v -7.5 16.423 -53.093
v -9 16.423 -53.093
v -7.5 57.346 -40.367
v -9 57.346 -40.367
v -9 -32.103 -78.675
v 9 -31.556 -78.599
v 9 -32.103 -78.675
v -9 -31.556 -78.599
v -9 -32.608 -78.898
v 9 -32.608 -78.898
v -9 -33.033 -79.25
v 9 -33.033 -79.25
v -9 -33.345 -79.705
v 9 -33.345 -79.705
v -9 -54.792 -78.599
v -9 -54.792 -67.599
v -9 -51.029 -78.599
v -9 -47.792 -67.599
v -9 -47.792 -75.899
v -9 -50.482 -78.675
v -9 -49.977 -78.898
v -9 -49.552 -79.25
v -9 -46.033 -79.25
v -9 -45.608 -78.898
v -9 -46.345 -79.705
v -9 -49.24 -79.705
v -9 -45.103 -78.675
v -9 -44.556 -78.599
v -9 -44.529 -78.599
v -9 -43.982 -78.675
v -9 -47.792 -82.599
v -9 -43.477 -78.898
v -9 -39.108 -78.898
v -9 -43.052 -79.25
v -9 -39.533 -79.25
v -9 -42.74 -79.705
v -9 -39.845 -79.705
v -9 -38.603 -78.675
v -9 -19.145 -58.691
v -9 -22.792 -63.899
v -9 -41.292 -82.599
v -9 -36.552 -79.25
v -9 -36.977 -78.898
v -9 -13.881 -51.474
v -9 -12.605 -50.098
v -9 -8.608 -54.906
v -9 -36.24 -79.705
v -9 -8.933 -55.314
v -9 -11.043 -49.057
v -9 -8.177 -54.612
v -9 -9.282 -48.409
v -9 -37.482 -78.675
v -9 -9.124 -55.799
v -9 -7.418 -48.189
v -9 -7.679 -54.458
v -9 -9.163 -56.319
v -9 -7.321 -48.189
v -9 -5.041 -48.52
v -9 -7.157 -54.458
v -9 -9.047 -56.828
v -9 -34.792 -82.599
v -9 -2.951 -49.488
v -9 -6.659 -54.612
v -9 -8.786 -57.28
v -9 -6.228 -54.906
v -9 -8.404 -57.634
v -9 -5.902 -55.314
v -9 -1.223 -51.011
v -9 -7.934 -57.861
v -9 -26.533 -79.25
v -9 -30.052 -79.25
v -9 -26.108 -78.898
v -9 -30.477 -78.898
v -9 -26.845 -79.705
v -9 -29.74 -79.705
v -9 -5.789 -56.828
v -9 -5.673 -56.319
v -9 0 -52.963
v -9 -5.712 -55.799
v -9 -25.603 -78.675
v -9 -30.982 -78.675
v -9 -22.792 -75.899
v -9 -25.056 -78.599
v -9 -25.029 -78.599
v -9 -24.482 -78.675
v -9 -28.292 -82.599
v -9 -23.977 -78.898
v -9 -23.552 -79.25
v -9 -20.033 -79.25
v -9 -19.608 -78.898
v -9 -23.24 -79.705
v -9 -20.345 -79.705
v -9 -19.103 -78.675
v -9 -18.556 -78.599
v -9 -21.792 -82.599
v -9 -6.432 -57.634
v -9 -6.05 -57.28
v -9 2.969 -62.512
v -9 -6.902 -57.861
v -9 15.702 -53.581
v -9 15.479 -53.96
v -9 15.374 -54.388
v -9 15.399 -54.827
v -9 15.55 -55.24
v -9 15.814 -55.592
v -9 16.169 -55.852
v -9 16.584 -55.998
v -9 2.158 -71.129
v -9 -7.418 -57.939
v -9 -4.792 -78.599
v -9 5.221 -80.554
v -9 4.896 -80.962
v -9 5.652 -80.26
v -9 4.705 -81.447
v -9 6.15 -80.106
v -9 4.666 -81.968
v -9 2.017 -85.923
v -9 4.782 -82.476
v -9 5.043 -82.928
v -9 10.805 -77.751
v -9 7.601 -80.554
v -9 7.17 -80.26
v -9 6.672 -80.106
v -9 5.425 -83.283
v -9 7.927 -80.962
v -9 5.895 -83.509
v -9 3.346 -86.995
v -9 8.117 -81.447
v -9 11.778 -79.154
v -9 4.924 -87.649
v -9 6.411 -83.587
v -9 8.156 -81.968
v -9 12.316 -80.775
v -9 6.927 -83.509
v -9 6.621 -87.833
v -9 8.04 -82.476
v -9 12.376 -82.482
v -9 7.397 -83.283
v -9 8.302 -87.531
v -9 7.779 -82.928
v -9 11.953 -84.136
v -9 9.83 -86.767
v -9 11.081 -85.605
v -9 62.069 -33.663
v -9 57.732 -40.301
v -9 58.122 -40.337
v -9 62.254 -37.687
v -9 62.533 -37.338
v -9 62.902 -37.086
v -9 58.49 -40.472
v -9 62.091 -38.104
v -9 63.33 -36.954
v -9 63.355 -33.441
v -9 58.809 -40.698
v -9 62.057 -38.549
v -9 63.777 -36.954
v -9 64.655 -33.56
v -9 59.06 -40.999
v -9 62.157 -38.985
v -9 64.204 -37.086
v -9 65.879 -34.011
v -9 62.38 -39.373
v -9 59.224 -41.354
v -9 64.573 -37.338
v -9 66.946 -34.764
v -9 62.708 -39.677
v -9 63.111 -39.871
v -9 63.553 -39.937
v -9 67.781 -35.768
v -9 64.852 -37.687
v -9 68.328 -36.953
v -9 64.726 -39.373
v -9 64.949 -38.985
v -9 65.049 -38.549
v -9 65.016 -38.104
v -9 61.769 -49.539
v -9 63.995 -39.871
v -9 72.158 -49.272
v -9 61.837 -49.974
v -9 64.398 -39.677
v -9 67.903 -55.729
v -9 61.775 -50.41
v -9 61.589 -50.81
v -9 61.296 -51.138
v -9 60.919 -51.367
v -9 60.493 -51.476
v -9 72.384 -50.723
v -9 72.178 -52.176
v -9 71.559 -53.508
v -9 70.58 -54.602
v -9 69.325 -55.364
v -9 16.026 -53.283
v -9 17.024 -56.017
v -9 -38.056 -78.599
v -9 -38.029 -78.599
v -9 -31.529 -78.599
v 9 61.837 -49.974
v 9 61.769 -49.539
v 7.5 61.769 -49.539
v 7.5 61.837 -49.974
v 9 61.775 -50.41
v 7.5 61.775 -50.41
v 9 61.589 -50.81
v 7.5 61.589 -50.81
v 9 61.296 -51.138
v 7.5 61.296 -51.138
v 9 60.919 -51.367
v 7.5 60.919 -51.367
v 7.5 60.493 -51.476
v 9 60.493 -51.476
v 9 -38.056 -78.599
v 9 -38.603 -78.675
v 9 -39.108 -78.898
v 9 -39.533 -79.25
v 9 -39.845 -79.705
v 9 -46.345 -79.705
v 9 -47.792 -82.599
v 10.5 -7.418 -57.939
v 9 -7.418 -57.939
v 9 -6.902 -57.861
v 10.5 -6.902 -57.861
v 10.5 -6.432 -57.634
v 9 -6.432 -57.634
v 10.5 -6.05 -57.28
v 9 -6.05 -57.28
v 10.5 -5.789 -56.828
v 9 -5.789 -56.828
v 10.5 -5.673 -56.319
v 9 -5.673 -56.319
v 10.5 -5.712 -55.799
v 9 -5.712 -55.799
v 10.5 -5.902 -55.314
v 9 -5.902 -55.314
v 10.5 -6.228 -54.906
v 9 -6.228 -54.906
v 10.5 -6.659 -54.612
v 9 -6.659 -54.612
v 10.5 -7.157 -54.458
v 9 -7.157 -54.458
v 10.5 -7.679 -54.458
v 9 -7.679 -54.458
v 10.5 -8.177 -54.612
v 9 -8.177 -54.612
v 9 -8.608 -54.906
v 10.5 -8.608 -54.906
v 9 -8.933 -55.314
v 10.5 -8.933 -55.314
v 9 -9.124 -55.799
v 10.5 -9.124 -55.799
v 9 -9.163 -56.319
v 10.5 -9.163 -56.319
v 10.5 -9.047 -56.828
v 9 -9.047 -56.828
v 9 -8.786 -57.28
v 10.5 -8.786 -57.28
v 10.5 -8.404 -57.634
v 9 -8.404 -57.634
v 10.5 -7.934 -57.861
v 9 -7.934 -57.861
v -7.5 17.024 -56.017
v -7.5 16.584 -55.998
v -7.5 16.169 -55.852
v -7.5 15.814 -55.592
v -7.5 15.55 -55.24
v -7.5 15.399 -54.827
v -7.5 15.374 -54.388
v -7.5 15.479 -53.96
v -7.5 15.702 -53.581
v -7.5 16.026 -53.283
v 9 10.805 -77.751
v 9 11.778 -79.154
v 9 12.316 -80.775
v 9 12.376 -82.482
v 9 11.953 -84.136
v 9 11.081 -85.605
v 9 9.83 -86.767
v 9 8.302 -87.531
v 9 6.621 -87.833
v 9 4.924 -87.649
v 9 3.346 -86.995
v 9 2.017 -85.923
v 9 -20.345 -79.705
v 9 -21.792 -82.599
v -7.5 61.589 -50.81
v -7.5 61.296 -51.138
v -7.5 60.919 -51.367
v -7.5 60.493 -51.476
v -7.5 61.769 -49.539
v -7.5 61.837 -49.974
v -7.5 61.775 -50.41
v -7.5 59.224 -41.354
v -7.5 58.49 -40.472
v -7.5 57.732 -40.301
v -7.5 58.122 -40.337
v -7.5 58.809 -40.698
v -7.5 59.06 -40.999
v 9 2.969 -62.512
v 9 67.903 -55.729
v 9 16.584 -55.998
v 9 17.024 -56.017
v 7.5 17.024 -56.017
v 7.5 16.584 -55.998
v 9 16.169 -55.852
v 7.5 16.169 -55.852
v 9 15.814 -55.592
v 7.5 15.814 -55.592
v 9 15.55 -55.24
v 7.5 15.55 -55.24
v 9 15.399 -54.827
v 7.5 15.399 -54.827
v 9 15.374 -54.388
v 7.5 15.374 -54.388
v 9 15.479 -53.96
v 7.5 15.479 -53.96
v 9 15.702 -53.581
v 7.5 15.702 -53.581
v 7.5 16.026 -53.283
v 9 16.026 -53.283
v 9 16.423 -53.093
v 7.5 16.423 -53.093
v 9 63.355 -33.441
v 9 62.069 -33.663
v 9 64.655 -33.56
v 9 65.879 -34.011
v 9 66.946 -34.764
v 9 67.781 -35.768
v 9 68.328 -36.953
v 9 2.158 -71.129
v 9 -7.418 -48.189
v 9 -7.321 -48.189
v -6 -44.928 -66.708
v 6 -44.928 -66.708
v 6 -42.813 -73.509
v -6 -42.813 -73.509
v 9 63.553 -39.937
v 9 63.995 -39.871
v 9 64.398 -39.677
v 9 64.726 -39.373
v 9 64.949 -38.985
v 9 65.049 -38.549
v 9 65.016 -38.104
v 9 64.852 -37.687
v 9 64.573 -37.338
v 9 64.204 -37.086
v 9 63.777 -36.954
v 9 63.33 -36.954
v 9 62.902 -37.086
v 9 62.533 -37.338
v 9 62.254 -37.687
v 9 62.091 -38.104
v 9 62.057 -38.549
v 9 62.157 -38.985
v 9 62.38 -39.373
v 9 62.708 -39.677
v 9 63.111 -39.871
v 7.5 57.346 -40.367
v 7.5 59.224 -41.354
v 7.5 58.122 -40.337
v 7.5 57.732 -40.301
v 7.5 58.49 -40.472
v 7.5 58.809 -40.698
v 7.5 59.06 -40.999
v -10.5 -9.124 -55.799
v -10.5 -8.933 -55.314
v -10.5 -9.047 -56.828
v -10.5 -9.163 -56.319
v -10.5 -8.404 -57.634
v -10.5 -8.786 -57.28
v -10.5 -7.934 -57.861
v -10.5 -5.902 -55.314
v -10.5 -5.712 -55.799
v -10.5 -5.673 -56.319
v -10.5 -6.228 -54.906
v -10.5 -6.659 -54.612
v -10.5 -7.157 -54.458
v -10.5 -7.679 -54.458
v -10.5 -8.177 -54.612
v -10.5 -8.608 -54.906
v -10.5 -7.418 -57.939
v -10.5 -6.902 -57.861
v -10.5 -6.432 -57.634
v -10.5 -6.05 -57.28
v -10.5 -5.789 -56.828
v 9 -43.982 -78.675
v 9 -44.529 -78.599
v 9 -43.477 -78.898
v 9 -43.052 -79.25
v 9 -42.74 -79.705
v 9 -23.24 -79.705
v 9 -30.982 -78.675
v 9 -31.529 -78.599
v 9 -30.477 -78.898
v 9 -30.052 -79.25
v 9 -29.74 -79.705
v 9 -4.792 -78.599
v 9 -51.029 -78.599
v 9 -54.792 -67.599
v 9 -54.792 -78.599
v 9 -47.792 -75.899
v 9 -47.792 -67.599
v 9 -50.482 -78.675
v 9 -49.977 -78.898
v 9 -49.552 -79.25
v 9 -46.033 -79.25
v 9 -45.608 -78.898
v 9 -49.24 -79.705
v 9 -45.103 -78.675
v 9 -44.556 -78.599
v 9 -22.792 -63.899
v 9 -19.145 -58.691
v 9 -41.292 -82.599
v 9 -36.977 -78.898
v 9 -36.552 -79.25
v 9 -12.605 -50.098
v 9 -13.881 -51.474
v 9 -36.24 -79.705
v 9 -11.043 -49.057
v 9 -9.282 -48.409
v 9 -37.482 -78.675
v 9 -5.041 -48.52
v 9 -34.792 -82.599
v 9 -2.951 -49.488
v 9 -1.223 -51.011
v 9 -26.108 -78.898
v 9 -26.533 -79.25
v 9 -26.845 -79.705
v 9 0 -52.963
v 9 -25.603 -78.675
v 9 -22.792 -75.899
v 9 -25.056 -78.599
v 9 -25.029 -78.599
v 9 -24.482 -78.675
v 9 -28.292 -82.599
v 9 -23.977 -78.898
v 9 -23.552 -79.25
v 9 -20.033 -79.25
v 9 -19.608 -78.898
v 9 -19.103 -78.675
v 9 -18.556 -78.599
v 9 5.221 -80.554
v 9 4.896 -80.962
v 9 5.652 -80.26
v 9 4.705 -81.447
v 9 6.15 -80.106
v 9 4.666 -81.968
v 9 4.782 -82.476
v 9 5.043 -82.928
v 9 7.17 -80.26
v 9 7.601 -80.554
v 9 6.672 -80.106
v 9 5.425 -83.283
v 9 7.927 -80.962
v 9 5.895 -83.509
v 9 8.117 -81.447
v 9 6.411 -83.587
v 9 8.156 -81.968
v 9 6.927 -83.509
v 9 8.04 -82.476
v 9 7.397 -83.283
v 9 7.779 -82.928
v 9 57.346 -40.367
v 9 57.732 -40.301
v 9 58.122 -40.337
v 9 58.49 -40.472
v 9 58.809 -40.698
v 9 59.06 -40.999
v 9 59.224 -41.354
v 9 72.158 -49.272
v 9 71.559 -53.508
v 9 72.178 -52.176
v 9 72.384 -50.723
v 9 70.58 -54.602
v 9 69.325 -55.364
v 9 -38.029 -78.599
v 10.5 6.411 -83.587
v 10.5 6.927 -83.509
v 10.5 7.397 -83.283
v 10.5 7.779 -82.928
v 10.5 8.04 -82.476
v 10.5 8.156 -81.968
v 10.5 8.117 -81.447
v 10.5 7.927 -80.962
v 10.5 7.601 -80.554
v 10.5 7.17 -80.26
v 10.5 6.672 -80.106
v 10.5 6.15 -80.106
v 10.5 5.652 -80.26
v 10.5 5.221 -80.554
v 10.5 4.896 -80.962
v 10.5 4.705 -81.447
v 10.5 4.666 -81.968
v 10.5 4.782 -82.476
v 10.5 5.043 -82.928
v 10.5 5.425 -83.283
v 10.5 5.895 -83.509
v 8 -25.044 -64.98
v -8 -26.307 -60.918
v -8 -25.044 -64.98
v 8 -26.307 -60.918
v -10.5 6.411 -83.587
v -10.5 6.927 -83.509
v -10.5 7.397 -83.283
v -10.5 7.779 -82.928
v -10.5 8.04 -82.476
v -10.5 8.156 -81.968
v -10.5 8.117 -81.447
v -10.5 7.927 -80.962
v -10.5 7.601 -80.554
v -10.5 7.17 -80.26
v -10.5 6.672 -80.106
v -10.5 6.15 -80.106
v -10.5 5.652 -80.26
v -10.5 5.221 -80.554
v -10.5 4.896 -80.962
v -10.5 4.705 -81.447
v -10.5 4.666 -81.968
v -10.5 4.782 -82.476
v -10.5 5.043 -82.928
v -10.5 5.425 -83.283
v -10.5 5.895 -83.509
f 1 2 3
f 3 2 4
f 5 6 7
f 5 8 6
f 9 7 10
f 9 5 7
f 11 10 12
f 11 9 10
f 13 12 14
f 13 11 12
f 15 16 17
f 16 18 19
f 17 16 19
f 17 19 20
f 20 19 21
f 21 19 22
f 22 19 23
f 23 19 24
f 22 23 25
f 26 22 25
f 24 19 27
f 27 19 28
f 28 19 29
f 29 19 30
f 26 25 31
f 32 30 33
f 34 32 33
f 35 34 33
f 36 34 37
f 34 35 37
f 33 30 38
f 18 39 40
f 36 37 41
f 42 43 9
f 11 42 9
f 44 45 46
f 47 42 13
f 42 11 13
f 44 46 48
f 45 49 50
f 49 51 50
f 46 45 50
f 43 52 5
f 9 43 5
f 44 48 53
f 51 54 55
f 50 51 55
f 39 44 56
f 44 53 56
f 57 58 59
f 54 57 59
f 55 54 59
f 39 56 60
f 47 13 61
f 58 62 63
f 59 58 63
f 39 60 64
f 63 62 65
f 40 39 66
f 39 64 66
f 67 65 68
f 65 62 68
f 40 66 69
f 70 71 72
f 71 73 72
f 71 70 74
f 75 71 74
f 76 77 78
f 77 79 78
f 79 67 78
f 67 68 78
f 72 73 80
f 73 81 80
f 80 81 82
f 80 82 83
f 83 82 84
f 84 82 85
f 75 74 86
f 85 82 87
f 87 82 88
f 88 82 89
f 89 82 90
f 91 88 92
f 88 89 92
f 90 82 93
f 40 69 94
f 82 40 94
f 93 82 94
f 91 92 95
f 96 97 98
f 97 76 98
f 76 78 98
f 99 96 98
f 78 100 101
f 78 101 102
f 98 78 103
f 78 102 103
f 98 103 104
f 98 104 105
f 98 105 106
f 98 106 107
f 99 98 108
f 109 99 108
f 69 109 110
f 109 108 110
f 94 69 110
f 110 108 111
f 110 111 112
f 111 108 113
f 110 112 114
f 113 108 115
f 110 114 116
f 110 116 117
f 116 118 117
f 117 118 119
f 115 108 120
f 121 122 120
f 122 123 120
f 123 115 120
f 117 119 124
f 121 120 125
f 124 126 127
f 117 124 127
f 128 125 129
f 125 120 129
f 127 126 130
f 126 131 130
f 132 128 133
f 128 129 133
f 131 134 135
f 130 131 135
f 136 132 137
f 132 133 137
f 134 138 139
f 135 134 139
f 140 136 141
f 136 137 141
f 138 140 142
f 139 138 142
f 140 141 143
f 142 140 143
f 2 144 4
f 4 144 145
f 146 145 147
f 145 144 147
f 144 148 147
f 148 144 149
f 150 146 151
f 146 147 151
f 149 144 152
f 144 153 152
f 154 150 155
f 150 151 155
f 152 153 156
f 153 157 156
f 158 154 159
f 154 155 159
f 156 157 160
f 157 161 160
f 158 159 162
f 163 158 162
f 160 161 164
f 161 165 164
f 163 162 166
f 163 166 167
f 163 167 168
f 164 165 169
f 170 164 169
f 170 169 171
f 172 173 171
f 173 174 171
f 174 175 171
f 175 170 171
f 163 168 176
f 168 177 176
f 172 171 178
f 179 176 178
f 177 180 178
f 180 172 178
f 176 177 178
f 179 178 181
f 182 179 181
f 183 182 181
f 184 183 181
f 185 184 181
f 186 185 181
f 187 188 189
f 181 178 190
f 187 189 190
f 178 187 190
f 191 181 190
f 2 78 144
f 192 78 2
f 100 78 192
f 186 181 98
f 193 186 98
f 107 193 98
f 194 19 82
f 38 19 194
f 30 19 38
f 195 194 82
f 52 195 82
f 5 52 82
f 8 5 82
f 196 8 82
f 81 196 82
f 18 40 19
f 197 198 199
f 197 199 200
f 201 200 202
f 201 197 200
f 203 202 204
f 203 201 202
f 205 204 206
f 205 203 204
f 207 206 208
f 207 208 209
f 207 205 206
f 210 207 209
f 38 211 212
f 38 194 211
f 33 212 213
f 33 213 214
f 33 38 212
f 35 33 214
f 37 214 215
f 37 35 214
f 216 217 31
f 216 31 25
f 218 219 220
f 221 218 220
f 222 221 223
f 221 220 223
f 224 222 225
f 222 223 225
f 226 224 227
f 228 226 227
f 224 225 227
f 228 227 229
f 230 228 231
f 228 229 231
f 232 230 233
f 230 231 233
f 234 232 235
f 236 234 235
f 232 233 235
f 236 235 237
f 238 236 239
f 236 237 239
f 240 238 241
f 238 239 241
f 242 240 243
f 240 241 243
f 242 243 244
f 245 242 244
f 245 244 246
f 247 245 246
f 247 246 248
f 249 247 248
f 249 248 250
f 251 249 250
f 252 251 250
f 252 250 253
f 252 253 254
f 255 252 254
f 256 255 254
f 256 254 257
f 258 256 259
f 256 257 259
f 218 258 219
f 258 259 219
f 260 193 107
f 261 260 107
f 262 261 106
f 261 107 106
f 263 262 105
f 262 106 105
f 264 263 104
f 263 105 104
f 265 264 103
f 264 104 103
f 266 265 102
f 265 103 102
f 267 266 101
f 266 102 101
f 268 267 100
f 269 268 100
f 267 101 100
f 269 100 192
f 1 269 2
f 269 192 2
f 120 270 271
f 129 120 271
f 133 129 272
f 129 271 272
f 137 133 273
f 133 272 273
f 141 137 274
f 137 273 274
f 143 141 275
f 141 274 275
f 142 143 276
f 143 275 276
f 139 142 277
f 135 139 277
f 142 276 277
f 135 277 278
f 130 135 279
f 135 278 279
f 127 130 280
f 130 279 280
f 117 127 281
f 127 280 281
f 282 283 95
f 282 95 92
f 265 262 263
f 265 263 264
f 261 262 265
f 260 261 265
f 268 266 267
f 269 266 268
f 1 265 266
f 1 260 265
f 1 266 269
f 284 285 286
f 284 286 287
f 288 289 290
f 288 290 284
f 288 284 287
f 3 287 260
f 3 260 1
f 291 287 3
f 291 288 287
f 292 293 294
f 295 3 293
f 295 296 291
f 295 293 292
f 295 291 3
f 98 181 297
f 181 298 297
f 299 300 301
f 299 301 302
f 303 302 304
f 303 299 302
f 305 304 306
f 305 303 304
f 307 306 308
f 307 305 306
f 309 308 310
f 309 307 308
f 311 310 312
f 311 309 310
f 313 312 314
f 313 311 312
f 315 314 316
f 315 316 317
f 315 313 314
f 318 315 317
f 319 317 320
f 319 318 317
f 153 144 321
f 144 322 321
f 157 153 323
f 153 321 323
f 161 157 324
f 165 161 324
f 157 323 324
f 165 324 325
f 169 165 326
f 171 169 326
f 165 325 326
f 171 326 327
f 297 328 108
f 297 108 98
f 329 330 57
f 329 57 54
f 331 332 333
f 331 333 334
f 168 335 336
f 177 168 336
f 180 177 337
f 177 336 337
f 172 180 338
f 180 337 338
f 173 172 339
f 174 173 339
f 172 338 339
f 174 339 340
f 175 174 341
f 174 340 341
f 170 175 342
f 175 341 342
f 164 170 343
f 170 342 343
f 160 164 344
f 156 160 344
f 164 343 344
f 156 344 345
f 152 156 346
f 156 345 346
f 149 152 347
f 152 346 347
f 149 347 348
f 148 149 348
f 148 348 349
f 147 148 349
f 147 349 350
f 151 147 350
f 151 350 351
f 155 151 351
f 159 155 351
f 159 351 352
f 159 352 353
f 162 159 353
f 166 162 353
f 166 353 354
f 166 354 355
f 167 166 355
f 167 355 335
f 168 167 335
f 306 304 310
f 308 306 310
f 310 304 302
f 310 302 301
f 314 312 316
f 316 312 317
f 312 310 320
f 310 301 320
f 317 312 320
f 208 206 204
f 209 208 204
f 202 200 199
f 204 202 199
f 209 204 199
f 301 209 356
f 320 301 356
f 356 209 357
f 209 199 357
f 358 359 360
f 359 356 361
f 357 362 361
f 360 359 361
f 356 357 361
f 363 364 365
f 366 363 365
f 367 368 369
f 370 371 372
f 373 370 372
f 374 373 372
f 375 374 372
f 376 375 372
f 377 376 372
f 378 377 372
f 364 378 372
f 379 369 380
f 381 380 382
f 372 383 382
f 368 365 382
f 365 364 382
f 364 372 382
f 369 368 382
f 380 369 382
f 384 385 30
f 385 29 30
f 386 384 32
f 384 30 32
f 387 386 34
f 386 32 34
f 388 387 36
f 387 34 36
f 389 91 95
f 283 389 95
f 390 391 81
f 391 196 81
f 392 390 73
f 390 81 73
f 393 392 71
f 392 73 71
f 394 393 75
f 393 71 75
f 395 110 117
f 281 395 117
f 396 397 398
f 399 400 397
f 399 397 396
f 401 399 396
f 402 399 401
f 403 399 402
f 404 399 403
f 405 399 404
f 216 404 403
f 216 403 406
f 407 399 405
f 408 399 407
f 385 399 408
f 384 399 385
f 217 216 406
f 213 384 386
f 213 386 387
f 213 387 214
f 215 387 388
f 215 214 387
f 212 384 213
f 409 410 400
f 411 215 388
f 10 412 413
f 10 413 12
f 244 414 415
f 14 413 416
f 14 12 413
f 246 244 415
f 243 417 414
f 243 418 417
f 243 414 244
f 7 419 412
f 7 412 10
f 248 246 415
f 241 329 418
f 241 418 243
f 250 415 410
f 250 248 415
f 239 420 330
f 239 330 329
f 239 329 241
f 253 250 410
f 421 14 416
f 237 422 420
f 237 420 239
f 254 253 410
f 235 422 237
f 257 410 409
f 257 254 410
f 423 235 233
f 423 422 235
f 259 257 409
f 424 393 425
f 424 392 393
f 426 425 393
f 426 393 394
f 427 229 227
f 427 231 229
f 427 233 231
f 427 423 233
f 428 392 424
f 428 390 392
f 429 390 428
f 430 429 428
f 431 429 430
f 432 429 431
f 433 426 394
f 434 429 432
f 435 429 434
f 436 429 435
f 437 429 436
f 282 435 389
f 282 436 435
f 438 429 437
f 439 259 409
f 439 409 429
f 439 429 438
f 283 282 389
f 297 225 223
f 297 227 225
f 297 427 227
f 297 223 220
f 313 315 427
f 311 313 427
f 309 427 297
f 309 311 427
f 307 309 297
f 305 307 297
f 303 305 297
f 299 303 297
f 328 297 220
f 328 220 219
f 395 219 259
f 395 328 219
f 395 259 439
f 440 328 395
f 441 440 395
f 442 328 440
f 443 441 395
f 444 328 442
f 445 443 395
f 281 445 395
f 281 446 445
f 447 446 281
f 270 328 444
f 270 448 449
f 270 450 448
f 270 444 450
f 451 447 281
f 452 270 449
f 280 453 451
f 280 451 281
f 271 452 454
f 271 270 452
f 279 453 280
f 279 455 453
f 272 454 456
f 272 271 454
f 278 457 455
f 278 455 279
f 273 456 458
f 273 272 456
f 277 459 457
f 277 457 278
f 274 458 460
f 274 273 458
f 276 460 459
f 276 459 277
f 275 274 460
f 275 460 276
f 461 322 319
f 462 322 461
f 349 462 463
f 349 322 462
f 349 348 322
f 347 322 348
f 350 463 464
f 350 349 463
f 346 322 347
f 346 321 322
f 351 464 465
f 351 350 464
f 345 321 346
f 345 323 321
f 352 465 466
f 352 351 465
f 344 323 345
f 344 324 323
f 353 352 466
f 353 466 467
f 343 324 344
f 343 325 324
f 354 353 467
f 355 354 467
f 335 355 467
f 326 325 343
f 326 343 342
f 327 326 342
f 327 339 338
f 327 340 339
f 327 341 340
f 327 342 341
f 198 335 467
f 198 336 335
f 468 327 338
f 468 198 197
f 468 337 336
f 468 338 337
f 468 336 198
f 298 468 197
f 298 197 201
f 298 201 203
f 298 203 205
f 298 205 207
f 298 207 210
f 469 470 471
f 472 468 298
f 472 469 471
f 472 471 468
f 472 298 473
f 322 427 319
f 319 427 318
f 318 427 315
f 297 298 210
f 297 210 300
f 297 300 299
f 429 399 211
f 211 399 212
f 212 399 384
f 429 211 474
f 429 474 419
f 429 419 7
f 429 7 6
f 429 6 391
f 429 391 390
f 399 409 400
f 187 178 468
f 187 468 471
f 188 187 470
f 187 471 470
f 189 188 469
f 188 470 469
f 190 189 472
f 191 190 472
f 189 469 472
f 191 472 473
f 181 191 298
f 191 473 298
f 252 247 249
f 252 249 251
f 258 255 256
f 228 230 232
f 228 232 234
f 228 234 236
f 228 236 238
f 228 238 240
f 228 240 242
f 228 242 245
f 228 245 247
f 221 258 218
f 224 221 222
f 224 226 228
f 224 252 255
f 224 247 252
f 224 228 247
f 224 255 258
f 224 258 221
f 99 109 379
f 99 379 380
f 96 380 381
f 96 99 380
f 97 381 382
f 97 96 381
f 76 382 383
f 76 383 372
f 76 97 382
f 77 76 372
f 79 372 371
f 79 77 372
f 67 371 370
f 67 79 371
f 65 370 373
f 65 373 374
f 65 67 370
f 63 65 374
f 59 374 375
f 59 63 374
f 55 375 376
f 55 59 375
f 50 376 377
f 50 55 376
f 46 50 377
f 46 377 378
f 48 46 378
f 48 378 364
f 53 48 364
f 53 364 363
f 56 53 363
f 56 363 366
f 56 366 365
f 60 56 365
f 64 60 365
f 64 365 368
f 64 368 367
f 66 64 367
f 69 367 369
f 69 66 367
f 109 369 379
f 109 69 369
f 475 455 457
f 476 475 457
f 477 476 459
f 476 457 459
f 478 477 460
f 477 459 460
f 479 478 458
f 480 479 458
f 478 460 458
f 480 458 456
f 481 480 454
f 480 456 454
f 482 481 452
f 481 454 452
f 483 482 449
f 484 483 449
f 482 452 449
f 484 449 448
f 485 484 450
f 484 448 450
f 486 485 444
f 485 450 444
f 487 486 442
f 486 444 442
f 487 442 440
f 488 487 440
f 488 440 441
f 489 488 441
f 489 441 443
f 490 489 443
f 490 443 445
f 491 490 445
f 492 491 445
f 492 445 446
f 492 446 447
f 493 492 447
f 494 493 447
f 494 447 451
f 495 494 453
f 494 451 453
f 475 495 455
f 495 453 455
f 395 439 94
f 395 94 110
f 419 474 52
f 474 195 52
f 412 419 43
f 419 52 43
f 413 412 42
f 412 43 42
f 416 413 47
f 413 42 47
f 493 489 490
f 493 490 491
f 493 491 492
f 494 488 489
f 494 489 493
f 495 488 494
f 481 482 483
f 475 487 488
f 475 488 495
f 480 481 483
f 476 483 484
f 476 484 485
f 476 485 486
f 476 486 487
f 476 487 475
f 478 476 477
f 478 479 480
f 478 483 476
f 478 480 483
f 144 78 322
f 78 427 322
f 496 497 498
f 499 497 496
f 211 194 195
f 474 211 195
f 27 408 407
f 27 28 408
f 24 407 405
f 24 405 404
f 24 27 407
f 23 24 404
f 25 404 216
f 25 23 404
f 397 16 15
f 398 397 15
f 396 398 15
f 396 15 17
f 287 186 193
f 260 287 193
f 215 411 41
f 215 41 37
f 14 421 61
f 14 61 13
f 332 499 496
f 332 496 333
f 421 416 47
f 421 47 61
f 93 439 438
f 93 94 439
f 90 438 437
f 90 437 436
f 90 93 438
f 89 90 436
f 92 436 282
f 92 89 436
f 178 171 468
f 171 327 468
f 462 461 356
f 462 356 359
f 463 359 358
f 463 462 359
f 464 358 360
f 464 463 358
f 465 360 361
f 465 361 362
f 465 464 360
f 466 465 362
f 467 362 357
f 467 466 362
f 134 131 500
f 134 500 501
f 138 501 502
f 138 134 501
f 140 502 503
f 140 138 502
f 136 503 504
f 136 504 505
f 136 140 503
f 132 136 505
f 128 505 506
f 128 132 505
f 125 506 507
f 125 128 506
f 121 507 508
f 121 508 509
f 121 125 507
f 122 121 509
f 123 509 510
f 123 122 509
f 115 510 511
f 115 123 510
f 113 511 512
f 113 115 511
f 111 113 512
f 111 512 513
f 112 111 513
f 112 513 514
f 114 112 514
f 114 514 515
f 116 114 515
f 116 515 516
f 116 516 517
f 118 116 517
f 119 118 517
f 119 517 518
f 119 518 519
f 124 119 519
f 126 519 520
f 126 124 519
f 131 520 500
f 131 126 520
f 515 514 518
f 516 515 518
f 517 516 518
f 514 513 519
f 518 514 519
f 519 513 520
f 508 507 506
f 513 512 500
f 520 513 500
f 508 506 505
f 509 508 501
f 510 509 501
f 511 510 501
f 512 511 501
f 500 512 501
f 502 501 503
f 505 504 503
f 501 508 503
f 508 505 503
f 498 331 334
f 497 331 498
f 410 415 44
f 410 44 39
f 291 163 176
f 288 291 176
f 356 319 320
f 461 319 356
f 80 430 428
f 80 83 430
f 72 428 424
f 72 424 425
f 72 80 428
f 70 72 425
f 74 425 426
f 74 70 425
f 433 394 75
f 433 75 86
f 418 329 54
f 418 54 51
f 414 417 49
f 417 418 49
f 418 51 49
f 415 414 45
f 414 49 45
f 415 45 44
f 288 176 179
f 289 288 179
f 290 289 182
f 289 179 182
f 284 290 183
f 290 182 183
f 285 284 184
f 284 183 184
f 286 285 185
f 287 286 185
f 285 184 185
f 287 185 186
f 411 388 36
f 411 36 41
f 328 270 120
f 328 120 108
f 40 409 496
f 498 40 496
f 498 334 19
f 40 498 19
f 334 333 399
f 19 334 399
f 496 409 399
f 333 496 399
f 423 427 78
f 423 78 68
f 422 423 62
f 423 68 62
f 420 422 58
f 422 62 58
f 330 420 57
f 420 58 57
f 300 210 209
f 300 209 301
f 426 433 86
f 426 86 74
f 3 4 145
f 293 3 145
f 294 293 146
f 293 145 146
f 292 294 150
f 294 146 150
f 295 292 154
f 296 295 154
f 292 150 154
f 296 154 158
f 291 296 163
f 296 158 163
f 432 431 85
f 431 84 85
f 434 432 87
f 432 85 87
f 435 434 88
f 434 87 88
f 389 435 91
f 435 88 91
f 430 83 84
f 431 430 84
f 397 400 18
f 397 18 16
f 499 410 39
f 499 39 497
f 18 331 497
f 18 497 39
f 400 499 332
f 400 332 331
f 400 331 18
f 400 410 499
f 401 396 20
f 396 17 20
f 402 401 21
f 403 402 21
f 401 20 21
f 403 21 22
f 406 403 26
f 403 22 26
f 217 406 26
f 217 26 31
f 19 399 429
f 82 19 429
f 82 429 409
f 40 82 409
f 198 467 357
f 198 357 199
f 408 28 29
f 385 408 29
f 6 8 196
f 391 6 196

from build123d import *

# Parameters (mm, degrees)
BOSS_EXTRUDE1_DEPTH    = 9
CUT_EXTRUDE1_DEPTH     = 25
BOSS_EXTRUDE2_DEPTH    = 18
FILLET1_R              = 2
LPATTERN1_COUNT        = 5
LPATTERN1_PITCH        = 6.5
FILLET1_OF_LPATTERN1_R = 2
FILLET2_R              = 8
FILLET3_R              = 5
SKETCH4_R              = 1.5
CUT_EXTRUDE2_DEPTH     = 25
CUT_EXTRUDE3_DEPTH     = 8
SKETCH6_R              = 1.75
BOSS_EXTRUDE3_DEPTH    = 1.5
SKETCH7_R              = 1.75
BOSS_EXTRUDE4_DEPTH    = 1.5
CUT_EXTRUDE4_DEPTH     = 1.5


with BuildPart() as part:
    # Sketch1 → Boss-Extrude1 (new, symmetric)
    with BuildSketch(Plane(origin=(0, 0, 0), x_dir=(0, 0, -1), z_dir=(1, 0, 0))):
        Polygon((78.599259113, -4.792439116), (85.922516335, 2.017105925), (77.751062285, 10.805014591), (71.129492545, 2.15772468), (62.512029777, 2.969258034), (52.963024241, 0), (48.188521473, -1.484629017), (48.188521473, -11.484629017), (58.691485012, -19.145422508), (67.599259113, -47.792439116), (67.599259113, -54.792439116), (78.599259113, -54.792439116), align=None)
        Polygon((62.512029777, 2.969258034), (52.963024241, 0), (32.178218004, 66.843038752), (55.09583129, 73.969258034), align=None)
        with BuildLine():
            Line((85.922516335, 2.017105925), (77.751062285, 10.805014591))
            ThreePointArc((77.751062285, 10.805014591), (86.230743643, 10.496787283), (85.922516335, 2.017105925))
        make_face()
    extrude(amount=BOSS_EXTRUDE1_DEPTH, both=True)

    # Sketch2 → Cut-Extrude1 (cut)
    with BuildSketch(Plane(origin=(9, 0, 0), x_dir=(0, 0, -1), z_dir=(1, 0, 0))):
        Polygon((75.899259113, -47.792439116), (75.899259113, -22.792439116), (63.899259113, -22.792439116), align=None)
    extrude(amount=-CUT_EXTRUDE1_DEPTH, mode=Mode.SUBTRACT)

    # Sketch3 → Boss-Extrude2 (add)
    with BuildSketch(Plane(origin=(9, 0, 0), x_dir=(0, 0, -1), z_dir=(1, 0, 0))):
        Polygon((78.599259113, -47.792439116), (78.599259113, -49.792439116), (82.599259113, -47.792439116), align=None)
        Polygon((78.599259113, -45.792439116), (78.599259113, -47.792439116), (82.599259113, -47.792439116), align=None)
    boss_extrude2 = extrude(amount=-BOSS_EXTRUDE2_DEPTH)

    # Fillet1
    fillet1_edges = [part.edges().sort_by_distance(p)[0] for p in [
        (0, -49.792439116, -78.599259113),
        (0, -45.792439116, -78.599259113),
    ]]
    fillet(fillet1_edges, radius=FILLET1_R)

    # LPattern1: Boss-Extrude2 ×5
    with Locations(*[(0, i * LPATTERN1_PITCH, 0) for i in range(1, LPATTERN1_COUNT)]):
        add(boss_extrude2)

    # Fillet1 of LPattern1
    fillet1_of_lpattern1_edges = [part.edges().sort_by_distance(p)[0] for p in [
        (0, -43.292439116, -78.599259113),
        (0, -39.292439116, -78.599259113),
        (0, -36.792439116, -78.599259113),
        (0, -32.792439116, -78.599259113),
        (0, -30.292439116, -78.599259113),
        (0, -26.292439116, -78.599259113),
        (0, -23.792439116, -78.599259113),
        (0, -19.792439116, -78.599259113),
    ]]
    fillet(fillet1_of_lpattern1_edges, radius=FILLET1_OF_LPATTERN1_R)

    # Fillet2
    # the kernel refuses this fillet: 8 mm, written as the material it takes off along each edge
    with BuildSketch(Plane(origin=(-19.167047595, -11.484629017, -48.188521473), x_dir=(0, -0.5892918069975562, -0.8079202721838058), z_dir=(1, 0, 0))) as fillet2_piece_1:
        with BuildLine():
            CenterArc((FILLET2_R * 0.508352379737, FILLET2_R), FILLET2_R, 216.10676877, 53.89323123)
            Line((-FILLET2_R * 0.299567892447, FILLET2_R * 0.410708193002), (-FILLET2_R * 0.31572629789, FILLET2_R * 0.398922356862))
            Line((-FILLET2_R * 0.31572629789, FILLET2_R * 0.398922356862), (-FILLET2_R * 0.0101670475947, -FILLET2_R * 0.02))
            Line((-FILLET2_R * 0.0101670475947, -FILLET2_R * 0.02), (FILLET2_R * 0.508352379737, -FILLET2_R * 0.02))
            Line((FILLET2_R * 0.508352379737, -FILLET2_R * 0.02), (FILLET2_R * 0.508352379737, 0))
        make_face()
    extrude(amount=38.334095189, mode=Mode.SUBTRACT)
    with BuildSketch(Plane(origin=(-23.590778332, -1.484629017, -48.188521473), x_dir=(0, -1, 0), z_dir=(1, 0, 0))) as fillet2_piece_2:
        with BuildLine():
            CenterArc((5.836311333, 8), FILLET2_R, 203.777574667, 66.222425333)
            Line((-1.484629017, 4.774502768), (-1.631047824, 4.709992823))
            ThreePointArc((-1.631047824, 4.709992823), (-0.895098597, 2.339743255), (-0.152784089, -0.047508129))
            Line((-0.152784089, -0.047508129), (0, -0.16))
            Line((0, -0.16), (5.836311333, -0.16))
            Line((5.836311333, -0.16), (5.836311333, 0))
        make_face()
    extrude(amount=47.181556665, mode=Mode.SUBTRACT)

    # Fillet3
    fillet3_edges = [part.edges().sort_by_distance(p)[0] for p in [
        (0, 66.843038752, -32.178218004),
        (0, 73.969258034, -55.09583129),
    ]]
    fillet(fillet3_edges, radius=FILLET3_R)

    # Sketch4 → Cut-Extrude2 (cut)
    with BuildSketch(Plane(origin=(9, 0, 0), x_dir=(0, 0, -1), z_dir=(1, 0, 0))):
        with Locations((38.437349789, 63.553165001)):
            Circle(SKETCH4_R)
    extrude(amount=-CUT_EXTRUDE2_DEPTH, mode=Mode.SUBTRACT)

    # Sketch5 → Cut-Extrude3 (cut)
    with BuildSketch(Plane(origin=(0, 14.953112663, -48.088564203), x_dir=(1, 0, 0), z_dir=(0, -0.29692580339417163, 0.95490055360688))):
        Polygon((-8, -43.208990891), (8, -43.208990891), (6, -62.708990891), (-6, -62.708990891), align=None)
    extrude(amount=-CUT_EXTRUDE3_DEPTH, mode=Mode.SUBTRACT)

    # Sketch6 → Boss-Extrude3 (add)
    with BuildSketch(Plane(origin=(9, 0, 0), x_dir=(0, 0, -1), z_dir=(1, 0, 0))):
        with Locations((81.83678931, 6.411060258)):
            Circle(SKETCH6_R)
    boss_extrude3 = extrude(amount=BOSS_EXTRUDE3_DEPTH)

    # Sketch7 → Boss-Extrude4 (add)
    with BuildSketch(Plane(origin=(9, 0, 0), x_dir=(0, 0, -1), z_dir=(1, 0, 0))):
        with Locations((56.188521473, -7.417809979)):
            Circle(SKETCH7_R)
    boss_extrude4 = extrude(amount=BOSS_EXTRUDE4_DEPTH)

    # Sketch8 → Cut-Extrude4 (cut)
    with BuildSketch(Plane(origin=(9, 0, 0), x_dir=(0, 0, -1), z_dir=(1, 0, 0))):
        with BuildLine():
            Line((41.354329636, 59.224050938), (49.539044528, 61.769083545))
            ThreePointArc((49.539044528, 61.769083545), (50.809758993, 61.589265105), (51.476316689, 60.492565163))
            Line((51.476316689, 60.492565163), (56.016764829, 17.023958099))
            ThreePointArc((56.016764829, 17.023958099), (54.826962078, 15.398858062), (53.092530542, 16.422736945))
            Line((53.092530542, 16.422736945), (40.367367511, 57.346311403))
            ThreePointArc((40.367367511, 57.346311403), (40.471955982, 58.48958772), (41.354329636, 59.224050938))
        make_face()
    cut_extrude4 = extrude(amount=-CUT_EXTRUDE4_DEPTH, mode=Mode.SUBTRACT)

    # Mirror1: Boss-Extrude3, Boss-Extrude4, Cut-Extrude4 across plane
    add(boss_extrude3.mirror(Plane(origin=(0, 0, 0), x_dir=(0, 0, 1), z_dir=(1, 0, 0))))
    add(boss_extrude4.mirror(Plane(origin=(0, 0, 0), x_dir=(0, 0, 1), z_dir=(1, 0, 0))))
    add(cut_extrude4.mirror(Plane(origin=(0, 0, 0), x_dir=(0, 0, 1), z_dir=(1, 0, 0))), mode=Mode.SUBTRACT)


solid = part.part
